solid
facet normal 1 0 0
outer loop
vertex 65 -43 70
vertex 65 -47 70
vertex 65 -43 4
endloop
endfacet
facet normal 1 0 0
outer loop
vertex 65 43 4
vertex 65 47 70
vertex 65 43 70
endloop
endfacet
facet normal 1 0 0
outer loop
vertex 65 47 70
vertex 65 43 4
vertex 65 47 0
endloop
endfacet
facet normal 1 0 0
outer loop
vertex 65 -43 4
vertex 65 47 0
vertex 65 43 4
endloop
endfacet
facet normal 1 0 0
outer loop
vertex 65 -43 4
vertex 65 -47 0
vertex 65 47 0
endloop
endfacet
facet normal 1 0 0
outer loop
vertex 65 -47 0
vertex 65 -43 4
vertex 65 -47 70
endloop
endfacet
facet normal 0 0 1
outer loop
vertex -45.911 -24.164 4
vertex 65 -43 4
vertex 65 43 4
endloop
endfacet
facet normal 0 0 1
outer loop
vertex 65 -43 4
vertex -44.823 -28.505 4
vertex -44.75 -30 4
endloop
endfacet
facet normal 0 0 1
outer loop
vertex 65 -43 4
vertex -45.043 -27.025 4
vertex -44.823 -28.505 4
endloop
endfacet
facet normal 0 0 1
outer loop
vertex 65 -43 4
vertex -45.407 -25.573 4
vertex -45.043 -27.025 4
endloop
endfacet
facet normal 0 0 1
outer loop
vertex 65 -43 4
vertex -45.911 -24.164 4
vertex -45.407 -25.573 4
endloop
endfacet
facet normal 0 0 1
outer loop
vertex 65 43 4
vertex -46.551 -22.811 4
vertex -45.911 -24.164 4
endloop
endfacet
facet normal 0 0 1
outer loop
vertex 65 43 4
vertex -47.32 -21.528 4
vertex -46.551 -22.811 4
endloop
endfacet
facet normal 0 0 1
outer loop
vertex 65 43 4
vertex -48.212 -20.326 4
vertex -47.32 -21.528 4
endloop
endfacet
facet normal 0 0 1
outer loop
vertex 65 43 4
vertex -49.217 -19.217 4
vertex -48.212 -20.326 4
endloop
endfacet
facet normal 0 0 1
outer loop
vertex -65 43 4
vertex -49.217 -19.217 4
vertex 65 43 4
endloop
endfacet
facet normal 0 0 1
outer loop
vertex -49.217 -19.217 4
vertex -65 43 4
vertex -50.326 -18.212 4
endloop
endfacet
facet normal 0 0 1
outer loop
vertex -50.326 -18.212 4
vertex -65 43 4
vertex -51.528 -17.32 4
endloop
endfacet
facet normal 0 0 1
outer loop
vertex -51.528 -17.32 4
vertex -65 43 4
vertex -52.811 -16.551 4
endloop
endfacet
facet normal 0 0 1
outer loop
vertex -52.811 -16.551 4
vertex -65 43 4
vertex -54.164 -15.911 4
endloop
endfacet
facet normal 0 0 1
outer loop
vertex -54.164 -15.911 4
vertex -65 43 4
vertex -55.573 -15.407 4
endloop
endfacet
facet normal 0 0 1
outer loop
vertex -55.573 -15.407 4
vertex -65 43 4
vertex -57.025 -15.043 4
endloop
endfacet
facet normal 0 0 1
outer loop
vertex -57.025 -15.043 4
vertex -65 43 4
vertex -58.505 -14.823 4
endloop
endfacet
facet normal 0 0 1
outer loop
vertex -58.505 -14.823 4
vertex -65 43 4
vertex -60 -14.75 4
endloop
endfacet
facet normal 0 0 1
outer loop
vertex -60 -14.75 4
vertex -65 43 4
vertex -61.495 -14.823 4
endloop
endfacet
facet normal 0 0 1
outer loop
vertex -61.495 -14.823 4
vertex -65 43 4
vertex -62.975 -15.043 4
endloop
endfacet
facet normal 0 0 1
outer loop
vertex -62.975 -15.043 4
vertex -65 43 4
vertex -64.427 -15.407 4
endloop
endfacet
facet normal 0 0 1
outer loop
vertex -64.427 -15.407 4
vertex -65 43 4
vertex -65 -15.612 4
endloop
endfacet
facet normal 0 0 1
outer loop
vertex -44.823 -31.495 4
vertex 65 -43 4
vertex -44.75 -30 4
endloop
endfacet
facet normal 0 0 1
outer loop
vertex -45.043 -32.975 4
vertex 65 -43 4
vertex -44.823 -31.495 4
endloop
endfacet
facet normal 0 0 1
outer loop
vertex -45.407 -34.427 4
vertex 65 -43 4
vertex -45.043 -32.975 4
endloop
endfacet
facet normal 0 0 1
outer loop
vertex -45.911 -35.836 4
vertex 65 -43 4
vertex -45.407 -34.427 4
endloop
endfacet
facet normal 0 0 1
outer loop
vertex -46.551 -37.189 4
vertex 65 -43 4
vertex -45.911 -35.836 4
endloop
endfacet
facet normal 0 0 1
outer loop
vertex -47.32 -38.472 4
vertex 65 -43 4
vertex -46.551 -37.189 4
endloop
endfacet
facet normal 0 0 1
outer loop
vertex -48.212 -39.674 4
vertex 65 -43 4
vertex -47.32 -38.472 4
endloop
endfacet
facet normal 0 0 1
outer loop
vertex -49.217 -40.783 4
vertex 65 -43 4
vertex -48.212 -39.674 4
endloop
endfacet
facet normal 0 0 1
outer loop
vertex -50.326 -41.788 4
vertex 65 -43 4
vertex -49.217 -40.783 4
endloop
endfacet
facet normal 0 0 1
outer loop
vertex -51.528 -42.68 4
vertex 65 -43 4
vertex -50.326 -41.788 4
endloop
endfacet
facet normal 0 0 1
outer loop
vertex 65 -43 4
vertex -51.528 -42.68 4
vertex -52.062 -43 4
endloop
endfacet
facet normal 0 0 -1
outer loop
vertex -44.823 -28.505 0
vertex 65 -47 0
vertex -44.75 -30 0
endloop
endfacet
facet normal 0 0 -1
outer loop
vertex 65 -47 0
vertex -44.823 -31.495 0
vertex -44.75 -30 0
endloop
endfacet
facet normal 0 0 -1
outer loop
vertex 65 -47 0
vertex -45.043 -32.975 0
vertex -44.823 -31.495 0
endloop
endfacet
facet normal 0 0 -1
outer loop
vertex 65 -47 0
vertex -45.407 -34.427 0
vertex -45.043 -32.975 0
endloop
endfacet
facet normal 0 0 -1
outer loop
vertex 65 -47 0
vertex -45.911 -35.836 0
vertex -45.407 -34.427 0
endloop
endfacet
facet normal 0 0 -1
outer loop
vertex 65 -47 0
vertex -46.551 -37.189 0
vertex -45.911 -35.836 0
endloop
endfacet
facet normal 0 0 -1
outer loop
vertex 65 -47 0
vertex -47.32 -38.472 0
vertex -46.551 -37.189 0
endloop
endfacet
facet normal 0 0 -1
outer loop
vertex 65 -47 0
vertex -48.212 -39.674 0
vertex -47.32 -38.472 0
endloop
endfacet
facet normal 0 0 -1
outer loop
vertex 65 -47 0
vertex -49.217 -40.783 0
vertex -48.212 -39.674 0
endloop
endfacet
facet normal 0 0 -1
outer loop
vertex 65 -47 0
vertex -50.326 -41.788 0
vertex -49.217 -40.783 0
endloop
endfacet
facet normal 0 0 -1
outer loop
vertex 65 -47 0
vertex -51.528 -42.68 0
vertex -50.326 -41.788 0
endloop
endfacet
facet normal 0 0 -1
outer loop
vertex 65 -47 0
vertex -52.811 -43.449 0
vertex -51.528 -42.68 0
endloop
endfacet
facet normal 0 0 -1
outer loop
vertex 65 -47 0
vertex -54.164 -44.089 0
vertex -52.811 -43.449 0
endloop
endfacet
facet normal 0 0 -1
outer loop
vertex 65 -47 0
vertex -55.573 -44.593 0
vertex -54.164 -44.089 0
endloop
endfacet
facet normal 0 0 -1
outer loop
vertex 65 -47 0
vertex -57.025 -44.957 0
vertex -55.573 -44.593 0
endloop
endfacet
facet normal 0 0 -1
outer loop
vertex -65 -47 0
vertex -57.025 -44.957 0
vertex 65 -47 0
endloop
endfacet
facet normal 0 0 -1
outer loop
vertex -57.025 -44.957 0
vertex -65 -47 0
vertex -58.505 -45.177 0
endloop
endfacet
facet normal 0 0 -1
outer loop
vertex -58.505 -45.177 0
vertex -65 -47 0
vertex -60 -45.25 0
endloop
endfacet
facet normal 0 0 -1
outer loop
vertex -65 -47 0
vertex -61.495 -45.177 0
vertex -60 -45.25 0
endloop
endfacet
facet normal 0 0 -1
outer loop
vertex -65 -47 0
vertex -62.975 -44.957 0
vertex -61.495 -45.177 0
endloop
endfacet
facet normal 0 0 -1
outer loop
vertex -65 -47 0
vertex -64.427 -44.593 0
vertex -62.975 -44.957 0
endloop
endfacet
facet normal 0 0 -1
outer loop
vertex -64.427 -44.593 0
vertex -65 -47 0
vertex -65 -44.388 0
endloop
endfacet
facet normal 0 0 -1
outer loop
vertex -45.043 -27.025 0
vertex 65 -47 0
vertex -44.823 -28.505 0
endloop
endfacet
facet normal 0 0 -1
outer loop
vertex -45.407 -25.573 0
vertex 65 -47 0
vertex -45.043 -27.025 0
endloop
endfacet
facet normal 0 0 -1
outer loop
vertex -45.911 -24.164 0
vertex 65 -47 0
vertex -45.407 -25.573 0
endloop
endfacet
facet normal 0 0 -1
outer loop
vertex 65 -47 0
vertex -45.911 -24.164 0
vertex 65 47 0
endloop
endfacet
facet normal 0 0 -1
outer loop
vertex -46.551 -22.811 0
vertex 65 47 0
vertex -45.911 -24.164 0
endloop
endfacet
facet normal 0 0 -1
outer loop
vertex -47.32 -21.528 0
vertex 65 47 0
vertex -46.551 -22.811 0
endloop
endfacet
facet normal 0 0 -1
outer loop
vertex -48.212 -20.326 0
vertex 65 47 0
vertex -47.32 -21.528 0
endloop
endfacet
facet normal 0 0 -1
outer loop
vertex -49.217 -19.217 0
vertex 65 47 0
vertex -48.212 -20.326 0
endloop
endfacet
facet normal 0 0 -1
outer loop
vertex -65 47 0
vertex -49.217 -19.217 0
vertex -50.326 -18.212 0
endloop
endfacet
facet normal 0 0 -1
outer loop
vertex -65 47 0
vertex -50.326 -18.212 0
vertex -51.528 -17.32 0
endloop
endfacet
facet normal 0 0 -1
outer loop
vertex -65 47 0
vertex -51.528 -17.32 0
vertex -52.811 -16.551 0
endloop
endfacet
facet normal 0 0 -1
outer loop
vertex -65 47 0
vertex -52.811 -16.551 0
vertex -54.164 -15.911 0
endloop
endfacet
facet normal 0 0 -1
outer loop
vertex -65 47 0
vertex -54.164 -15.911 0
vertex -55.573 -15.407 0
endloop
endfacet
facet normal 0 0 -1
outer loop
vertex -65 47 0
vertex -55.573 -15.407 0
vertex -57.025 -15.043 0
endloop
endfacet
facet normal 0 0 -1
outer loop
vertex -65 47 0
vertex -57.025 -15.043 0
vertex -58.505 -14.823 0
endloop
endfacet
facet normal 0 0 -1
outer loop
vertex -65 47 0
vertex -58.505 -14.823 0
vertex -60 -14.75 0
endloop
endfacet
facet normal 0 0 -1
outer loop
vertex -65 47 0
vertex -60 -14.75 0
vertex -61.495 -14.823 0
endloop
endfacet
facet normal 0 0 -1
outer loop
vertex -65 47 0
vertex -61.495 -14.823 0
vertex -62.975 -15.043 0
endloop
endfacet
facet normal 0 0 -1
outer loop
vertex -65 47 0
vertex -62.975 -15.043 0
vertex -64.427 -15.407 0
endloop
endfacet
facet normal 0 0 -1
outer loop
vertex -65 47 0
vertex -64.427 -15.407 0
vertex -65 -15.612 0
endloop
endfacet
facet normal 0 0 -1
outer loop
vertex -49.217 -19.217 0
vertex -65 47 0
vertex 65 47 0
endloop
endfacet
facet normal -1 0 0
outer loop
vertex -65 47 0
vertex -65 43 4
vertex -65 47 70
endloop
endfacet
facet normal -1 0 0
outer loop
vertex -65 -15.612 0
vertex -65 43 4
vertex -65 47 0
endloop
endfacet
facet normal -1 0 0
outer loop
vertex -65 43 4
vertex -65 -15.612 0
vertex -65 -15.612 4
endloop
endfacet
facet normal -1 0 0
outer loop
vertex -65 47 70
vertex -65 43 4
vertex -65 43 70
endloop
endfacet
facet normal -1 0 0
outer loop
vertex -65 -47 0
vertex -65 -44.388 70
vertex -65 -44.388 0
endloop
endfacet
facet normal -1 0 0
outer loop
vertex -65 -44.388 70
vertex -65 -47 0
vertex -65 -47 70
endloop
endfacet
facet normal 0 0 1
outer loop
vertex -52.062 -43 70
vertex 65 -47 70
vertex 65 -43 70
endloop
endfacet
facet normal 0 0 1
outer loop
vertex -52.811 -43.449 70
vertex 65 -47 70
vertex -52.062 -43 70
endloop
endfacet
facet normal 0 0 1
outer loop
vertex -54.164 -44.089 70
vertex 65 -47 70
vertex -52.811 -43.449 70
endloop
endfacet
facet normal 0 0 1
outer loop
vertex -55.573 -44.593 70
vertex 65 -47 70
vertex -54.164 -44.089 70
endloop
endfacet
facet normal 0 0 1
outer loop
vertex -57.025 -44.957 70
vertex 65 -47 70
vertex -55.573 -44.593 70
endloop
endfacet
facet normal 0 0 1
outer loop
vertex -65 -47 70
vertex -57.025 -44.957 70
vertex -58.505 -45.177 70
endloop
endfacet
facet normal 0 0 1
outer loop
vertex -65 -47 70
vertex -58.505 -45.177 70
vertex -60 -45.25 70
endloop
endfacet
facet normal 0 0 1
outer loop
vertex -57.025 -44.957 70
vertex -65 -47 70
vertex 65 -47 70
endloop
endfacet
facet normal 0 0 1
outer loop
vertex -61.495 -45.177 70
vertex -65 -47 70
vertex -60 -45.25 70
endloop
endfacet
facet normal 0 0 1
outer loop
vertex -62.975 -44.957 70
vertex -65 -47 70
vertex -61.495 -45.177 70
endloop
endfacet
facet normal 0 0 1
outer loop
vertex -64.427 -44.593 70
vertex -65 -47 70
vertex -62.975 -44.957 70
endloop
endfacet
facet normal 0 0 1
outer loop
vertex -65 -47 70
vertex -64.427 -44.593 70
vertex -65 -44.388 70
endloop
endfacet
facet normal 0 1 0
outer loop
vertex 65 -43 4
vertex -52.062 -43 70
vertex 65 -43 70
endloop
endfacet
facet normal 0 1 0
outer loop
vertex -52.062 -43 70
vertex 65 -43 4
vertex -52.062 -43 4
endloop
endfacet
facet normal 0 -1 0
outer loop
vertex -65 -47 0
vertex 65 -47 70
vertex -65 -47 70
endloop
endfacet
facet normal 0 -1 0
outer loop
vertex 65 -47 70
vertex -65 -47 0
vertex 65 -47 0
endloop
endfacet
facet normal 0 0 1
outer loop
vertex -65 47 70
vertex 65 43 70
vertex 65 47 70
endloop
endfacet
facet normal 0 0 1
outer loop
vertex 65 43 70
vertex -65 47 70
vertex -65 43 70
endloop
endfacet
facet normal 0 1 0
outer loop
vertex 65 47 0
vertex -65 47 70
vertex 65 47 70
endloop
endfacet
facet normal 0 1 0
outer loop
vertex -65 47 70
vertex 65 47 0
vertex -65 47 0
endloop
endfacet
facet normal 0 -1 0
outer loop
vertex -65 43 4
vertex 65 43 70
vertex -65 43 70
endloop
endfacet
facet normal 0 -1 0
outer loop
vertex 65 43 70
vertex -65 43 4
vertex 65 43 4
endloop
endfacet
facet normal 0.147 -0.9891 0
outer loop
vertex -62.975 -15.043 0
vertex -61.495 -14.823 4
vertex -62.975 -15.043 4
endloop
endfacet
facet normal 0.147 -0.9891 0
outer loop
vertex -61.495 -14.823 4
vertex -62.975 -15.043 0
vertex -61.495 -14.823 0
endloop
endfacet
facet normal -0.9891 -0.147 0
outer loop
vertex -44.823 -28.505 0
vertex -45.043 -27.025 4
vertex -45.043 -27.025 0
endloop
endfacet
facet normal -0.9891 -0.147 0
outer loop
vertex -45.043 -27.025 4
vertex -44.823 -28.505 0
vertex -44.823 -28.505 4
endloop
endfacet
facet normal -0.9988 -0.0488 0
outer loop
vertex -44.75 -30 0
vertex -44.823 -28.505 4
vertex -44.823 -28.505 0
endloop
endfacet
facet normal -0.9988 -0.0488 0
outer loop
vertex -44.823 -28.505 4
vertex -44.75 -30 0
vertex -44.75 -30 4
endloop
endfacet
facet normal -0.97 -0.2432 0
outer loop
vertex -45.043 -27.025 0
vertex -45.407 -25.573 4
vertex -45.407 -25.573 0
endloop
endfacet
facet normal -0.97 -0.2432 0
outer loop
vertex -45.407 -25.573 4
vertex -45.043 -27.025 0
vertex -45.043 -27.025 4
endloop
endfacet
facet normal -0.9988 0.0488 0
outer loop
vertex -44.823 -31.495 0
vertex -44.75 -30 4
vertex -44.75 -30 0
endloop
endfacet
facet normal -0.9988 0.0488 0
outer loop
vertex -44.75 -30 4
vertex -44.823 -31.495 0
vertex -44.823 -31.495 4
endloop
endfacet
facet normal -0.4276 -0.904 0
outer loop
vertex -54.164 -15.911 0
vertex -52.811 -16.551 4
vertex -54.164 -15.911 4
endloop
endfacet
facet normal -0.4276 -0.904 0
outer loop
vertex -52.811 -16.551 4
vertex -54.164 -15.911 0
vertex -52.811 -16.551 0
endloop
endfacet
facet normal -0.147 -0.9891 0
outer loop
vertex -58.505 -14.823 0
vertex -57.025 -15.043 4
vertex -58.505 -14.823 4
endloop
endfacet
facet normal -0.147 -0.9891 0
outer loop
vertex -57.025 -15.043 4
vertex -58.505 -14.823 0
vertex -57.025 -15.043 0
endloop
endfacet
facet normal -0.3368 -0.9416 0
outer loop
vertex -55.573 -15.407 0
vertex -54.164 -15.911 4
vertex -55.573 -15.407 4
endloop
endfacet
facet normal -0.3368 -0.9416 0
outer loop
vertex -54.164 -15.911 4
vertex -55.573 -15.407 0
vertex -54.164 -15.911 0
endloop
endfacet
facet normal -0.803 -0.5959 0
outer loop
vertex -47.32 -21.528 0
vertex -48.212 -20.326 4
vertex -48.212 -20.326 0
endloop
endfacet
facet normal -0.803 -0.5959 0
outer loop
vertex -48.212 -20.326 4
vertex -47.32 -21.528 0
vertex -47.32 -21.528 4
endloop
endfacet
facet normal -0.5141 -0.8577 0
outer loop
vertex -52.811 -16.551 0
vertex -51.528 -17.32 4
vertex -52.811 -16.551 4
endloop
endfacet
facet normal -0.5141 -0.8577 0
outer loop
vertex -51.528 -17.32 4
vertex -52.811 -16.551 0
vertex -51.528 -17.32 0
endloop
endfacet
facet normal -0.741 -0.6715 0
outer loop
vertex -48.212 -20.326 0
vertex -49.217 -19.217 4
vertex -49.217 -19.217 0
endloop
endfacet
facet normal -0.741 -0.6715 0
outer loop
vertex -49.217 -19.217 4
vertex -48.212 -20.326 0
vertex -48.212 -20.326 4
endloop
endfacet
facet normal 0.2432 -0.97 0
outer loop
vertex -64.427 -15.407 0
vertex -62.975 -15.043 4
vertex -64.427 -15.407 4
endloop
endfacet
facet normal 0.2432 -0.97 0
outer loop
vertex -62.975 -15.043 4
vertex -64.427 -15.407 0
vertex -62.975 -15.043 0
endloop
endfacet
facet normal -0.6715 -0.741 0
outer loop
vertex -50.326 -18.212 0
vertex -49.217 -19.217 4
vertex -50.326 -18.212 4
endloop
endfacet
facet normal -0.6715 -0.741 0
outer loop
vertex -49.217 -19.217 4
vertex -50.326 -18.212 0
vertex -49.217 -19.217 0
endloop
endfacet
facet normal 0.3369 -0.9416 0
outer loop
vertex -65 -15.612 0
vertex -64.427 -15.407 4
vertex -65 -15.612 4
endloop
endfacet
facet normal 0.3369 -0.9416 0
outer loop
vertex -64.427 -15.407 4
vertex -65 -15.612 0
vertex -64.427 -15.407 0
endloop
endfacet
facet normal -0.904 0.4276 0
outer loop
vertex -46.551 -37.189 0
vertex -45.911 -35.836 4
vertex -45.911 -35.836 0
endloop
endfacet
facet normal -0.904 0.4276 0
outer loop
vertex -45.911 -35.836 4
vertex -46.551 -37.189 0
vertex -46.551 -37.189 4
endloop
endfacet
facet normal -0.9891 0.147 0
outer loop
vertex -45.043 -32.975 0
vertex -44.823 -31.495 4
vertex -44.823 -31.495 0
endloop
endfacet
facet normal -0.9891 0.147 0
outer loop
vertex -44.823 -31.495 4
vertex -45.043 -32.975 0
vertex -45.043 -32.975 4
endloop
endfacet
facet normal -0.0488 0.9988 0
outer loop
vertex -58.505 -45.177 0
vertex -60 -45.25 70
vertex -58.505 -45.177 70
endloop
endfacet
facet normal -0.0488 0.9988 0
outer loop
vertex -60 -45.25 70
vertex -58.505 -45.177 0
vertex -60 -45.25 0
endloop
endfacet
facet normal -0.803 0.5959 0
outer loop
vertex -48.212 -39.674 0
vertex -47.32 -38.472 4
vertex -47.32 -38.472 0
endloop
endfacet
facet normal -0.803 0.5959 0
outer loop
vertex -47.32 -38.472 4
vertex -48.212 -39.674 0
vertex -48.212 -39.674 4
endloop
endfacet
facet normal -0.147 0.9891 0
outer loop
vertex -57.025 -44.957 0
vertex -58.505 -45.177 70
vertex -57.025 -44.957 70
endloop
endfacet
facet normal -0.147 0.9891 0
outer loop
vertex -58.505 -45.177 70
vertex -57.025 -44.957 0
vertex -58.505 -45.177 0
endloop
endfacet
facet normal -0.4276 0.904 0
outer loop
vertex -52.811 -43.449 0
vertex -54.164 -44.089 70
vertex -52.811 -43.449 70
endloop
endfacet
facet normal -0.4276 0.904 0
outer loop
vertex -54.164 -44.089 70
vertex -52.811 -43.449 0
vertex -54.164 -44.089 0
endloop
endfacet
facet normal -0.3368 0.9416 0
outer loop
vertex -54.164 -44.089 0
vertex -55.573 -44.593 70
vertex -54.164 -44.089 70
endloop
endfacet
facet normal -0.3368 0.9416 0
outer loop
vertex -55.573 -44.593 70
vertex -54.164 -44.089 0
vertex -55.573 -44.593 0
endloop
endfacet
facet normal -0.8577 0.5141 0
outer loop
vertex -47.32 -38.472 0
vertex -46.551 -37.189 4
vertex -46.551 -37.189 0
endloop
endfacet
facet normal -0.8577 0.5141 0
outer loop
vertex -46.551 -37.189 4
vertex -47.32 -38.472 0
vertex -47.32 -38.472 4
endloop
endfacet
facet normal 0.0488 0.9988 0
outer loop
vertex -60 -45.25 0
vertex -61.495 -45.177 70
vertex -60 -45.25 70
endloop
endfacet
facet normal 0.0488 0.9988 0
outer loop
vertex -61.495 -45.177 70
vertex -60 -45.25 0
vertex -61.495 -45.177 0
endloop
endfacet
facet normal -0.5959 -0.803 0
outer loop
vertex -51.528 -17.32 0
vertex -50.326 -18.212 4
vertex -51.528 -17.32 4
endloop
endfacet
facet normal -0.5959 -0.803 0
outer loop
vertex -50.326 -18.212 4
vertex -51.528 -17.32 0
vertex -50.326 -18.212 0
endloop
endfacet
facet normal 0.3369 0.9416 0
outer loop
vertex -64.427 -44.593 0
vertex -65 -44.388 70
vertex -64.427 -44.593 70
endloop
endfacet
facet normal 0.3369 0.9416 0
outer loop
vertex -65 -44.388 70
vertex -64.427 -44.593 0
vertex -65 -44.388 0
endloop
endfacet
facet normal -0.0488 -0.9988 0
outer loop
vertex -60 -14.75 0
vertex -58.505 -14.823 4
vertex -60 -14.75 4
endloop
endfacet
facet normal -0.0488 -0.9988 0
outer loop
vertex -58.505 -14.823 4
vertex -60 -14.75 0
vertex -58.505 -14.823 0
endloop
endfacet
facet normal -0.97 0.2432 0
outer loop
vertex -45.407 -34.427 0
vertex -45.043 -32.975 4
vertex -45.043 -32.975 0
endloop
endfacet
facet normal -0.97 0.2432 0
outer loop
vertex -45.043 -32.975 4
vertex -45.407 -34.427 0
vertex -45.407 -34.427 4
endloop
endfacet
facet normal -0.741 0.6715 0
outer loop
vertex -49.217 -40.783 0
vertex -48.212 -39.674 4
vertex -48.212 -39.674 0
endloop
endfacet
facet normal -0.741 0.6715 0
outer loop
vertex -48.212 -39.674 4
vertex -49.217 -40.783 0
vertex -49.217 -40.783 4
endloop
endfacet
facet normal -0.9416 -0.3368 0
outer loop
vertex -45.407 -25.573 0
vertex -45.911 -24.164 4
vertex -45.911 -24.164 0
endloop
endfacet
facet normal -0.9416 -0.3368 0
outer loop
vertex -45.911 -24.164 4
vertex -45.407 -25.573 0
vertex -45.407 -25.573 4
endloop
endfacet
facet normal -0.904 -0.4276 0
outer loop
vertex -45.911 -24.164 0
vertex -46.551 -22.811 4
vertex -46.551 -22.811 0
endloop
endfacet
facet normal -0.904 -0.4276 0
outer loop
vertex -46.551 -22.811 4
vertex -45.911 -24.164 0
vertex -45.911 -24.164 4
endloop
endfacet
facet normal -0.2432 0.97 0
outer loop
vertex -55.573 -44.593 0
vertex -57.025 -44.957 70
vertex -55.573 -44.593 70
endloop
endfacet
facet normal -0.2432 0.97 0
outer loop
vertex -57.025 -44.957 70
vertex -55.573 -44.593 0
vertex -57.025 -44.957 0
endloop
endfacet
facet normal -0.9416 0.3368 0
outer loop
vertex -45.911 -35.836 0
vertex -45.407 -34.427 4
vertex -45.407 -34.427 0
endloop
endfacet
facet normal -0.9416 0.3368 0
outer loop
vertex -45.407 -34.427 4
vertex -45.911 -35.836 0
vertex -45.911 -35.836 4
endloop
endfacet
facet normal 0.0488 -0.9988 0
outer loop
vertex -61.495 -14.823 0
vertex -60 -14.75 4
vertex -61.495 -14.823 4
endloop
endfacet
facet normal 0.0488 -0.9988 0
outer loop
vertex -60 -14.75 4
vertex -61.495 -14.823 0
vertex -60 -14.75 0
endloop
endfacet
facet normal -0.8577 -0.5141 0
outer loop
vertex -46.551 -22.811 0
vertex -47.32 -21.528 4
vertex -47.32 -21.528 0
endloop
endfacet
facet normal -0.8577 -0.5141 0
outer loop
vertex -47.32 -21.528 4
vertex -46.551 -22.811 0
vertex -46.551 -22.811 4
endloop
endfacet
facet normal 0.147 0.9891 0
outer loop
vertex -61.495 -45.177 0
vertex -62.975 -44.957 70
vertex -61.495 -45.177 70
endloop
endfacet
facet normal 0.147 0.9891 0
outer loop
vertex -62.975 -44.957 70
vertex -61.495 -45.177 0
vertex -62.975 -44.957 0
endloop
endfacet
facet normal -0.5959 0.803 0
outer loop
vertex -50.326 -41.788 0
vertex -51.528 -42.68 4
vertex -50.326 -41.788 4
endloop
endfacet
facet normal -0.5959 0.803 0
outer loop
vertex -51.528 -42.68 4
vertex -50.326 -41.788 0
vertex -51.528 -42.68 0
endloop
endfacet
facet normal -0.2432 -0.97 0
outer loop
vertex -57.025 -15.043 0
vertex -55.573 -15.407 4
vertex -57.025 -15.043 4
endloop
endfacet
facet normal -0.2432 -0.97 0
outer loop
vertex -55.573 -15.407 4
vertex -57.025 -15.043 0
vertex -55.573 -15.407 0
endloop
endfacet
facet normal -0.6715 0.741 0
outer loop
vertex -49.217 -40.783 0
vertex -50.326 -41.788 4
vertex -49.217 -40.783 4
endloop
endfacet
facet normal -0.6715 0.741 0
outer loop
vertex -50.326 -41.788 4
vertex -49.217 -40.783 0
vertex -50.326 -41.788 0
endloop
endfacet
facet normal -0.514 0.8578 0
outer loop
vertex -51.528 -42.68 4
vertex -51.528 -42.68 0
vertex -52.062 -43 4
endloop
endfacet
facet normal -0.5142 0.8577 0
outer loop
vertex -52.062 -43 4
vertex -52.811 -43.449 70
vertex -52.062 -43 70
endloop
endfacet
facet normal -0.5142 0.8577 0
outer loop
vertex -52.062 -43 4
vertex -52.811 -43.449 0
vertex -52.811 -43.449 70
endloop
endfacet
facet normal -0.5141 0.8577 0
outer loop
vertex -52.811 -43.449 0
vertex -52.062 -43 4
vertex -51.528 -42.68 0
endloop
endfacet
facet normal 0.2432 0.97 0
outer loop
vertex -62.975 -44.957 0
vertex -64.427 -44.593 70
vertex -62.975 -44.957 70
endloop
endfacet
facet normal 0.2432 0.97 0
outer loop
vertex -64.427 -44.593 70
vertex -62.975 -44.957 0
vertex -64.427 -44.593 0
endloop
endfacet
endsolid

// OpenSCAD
// Built by bench/smallmodels/features/compiler.py from a list of features.
$fn = 64;
difference() {
  union() {
    translate([0, 0, 0]) translate([-65, -45, 0]) cube([130, 90, 4]);
    translate([0, -45, 0]) translate([-65, -2, 0]) cube([130, 4, 70]);
    translate([0, 45, 0]) translate([-65, -2, 0]) cube([130, 4, 70]);
  }
  union() {
    translate([-60, -30, -1]) rotate([0, 0, 0]) cylinder(d = 30.5, h = 72);
  }
}
